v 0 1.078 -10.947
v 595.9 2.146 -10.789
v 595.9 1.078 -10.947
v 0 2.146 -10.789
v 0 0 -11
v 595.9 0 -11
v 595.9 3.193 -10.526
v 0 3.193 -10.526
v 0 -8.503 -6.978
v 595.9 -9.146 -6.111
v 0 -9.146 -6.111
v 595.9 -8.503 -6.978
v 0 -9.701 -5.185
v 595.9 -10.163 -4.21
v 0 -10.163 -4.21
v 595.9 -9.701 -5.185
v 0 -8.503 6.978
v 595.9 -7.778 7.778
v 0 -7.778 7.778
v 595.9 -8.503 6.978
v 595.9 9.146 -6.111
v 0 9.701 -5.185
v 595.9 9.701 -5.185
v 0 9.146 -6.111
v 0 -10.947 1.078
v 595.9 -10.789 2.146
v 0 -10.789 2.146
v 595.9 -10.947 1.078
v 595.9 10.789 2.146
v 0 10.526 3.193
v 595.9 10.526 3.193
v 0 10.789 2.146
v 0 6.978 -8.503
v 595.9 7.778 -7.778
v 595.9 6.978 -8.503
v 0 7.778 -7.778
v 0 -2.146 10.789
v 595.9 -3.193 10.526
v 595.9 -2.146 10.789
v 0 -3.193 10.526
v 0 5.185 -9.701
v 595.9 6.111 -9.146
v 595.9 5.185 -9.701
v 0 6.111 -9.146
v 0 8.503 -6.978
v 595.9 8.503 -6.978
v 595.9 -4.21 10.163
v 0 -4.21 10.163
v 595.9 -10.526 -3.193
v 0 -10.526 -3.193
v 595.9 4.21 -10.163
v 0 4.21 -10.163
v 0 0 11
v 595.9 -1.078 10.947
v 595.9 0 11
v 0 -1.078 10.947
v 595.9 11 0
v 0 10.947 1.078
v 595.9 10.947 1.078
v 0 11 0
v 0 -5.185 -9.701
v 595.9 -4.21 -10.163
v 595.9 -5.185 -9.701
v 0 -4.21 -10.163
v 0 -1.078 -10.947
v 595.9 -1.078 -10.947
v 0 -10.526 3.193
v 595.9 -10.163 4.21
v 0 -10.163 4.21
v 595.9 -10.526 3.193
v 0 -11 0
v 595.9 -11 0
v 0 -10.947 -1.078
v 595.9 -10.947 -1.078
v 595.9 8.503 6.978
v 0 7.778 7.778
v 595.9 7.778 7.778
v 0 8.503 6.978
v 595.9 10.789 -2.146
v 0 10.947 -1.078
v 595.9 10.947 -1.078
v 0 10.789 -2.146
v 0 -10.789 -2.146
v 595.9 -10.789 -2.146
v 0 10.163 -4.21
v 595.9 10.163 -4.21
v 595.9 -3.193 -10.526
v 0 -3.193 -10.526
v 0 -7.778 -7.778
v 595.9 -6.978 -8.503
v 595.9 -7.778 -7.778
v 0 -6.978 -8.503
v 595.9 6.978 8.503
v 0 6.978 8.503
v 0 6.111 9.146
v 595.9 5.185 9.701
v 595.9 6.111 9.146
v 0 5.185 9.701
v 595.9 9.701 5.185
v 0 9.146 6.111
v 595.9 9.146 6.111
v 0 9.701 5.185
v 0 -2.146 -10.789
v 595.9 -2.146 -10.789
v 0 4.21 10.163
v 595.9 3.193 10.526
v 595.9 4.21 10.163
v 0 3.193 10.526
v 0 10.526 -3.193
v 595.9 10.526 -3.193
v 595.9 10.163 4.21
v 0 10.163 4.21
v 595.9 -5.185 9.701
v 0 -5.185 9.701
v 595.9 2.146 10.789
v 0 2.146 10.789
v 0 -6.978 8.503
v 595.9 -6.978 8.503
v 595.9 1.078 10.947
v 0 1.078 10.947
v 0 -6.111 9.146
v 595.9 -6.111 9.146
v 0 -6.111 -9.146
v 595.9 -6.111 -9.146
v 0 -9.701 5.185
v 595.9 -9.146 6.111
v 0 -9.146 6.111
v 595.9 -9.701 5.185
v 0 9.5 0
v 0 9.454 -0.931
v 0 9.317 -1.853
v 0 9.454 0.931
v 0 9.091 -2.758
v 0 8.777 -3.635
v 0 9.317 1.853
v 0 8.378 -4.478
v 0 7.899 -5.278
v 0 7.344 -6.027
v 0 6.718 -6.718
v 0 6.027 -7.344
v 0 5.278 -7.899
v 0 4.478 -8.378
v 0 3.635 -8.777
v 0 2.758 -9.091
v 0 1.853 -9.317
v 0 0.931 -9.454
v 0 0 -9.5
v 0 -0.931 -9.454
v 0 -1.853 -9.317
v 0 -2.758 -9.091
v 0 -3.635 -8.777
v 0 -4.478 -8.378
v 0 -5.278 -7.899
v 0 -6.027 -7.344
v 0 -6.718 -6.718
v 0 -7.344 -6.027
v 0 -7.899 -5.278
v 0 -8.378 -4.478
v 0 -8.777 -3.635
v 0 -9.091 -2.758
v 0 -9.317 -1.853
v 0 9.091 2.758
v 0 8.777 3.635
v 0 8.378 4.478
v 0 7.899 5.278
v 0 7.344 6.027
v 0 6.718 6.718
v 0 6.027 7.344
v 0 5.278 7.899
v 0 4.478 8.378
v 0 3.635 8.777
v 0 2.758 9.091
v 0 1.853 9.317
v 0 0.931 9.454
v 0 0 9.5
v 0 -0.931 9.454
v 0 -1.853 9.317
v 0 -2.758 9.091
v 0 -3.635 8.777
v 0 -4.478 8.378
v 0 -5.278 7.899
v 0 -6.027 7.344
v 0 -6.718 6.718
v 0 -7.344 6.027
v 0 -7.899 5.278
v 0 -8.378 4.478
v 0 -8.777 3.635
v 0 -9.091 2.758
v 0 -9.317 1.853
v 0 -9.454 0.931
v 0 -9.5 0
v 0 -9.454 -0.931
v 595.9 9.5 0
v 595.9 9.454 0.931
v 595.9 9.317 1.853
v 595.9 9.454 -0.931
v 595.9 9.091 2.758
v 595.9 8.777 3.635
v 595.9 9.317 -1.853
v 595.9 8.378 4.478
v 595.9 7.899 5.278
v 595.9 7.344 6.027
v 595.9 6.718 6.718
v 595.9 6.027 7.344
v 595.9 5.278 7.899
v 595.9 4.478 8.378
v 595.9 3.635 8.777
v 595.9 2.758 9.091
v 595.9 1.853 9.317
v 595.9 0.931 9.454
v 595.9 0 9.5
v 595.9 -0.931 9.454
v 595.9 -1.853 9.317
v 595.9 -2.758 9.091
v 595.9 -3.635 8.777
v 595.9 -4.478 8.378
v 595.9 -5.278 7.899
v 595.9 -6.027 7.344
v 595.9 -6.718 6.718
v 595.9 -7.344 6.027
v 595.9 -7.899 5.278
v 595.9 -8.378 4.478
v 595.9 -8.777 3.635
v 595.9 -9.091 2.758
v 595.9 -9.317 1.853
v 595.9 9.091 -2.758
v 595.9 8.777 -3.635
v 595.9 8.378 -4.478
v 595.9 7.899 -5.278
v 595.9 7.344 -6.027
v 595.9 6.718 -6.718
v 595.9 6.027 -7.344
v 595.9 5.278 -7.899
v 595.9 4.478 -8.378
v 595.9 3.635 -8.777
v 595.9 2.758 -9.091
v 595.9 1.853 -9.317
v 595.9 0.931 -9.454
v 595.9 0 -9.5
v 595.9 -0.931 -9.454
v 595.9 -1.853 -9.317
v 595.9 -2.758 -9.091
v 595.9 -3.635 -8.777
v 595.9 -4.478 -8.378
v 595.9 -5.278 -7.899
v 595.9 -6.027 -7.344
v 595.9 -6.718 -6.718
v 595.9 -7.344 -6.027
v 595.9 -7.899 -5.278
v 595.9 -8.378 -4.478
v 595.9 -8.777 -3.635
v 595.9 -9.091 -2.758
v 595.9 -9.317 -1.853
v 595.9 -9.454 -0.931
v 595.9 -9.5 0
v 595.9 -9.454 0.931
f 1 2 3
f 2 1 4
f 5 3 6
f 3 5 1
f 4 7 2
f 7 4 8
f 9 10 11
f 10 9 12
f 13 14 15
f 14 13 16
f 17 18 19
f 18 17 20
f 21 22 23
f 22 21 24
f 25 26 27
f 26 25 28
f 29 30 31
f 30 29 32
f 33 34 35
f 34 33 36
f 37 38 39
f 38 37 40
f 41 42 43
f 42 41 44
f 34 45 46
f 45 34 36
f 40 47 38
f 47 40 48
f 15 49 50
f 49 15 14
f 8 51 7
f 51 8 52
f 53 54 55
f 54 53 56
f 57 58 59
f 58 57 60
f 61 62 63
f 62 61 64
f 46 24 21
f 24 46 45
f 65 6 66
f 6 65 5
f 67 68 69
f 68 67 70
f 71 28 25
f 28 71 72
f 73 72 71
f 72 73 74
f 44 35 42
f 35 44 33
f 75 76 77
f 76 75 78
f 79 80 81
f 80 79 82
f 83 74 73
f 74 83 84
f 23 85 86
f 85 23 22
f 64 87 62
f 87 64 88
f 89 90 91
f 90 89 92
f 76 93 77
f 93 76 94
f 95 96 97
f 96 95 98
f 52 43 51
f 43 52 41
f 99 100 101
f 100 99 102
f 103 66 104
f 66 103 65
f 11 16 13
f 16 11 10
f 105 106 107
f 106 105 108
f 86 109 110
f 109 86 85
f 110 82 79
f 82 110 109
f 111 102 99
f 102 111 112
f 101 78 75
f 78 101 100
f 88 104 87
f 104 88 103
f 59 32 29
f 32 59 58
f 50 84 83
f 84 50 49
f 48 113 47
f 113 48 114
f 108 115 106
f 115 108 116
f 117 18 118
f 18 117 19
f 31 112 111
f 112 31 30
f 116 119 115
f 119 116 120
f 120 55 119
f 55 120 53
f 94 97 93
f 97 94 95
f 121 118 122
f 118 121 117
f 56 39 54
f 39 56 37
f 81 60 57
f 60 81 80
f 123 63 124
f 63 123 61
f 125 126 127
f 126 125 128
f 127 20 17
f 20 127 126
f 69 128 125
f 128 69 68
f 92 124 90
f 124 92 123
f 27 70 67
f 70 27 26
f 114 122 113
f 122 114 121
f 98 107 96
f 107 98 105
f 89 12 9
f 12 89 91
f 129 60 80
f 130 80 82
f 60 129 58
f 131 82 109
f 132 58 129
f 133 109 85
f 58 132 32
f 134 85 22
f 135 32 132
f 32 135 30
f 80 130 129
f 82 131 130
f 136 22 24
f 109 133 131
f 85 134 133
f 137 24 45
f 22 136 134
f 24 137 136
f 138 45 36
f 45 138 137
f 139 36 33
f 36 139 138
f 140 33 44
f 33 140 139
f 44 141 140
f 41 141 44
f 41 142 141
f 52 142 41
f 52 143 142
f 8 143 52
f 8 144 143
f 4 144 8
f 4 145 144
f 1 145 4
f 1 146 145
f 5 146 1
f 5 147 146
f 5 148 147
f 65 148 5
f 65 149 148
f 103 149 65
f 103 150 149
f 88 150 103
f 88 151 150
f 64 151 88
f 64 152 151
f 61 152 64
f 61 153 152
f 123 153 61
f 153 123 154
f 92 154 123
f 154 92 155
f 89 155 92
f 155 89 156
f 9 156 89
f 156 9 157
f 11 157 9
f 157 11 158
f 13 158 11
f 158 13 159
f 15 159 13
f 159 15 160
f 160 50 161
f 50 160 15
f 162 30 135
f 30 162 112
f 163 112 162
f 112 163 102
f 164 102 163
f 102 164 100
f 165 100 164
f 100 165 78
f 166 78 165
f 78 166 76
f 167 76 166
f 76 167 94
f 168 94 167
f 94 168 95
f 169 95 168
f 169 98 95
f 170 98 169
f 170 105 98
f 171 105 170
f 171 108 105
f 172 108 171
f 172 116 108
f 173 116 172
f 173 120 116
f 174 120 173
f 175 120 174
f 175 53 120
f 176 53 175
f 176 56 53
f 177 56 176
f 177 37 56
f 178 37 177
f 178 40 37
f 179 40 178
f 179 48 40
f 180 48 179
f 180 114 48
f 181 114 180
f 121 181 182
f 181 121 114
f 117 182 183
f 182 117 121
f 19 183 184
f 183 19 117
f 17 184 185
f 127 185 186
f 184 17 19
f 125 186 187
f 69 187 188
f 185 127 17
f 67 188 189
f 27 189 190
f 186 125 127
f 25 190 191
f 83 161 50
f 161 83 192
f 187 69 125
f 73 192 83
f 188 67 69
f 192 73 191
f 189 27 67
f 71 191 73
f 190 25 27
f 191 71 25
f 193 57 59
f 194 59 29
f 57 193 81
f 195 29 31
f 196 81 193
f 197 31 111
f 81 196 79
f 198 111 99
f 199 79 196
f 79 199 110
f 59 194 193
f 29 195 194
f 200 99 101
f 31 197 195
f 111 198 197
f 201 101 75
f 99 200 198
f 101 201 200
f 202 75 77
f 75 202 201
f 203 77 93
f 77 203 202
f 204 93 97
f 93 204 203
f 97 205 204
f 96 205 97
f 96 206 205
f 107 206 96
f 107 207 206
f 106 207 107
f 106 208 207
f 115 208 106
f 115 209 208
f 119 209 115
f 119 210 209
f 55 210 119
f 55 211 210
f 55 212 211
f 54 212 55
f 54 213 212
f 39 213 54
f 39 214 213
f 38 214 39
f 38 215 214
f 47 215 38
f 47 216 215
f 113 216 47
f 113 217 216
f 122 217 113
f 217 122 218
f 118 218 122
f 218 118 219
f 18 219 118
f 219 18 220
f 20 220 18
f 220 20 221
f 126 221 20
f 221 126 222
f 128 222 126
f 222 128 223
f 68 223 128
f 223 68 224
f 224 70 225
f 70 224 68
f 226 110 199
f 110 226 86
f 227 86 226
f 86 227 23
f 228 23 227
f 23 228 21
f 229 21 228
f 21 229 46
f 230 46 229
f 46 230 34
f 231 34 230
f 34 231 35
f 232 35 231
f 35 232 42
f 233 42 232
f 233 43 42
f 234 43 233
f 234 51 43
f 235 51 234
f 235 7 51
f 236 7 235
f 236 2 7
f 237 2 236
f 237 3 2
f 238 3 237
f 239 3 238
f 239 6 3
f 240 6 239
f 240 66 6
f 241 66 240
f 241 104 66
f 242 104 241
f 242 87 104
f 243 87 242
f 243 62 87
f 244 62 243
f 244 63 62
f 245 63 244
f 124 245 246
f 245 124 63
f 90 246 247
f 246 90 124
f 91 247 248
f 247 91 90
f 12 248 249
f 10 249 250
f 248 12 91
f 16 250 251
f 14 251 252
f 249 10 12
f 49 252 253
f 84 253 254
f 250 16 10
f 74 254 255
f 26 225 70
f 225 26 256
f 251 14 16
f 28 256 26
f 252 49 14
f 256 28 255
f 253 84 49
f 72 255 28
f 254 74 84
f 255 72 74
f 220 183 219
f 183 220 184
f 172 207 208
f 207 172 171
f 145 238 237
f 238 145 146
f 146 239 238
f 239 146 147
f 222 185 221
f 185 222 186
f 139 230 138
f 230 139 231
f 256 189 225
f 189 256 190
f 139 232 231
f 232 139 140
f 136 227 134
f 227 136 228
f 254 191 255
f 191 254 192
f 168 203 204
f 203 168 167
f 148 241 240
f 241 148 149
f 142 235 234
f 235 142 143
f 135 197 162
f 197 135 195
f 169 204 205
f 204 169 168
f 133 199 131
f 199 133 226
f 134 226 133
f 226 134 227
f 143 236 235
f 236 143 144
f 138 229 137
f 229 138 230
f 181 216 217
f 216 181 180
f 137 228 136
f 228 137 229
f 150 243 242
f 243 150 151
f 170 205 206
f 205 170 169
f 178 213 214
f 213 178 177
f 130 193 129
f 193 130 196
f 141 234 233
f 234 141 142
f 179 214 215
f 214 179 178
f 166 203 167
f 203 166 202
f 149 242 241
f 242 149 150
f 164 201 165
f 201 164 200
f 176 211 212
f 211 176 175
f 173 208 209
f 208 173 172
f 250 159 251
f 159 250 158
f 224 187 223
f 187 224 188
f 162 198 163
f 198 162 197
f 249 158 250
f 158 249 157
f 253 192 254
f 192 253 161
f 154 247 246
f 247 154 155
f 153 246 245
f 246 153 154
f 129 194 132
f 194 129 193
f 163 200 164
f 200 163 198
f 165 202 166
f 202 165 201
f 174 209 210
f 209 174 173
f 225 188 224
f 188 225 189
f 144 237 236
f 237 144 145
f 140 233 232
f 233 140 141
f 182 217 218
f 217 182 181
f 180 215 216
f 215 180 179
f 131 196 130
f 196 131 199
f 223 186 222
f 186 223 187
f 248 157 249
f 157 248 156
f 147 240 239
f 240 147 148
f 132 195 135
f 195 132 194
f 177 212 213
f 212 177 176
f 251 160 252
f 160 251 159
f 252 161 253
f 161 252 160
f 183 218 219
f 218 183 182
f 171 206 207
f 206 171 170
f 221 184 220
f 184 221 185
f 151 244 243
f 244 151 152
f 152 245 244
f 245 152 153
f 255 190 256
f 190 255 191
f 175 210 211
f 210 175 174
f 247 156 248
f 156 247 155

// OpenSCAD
// file: ../common/ds_lib.scad
// DronSwarm · librería común de piezas del frame (S07-S08). Unidades: mm.
//
// Reglas (ADR-003): sin hull()/minkowski()/offset() — FreeCAD los convierte en malla y el STEP deja de ser un
// sólido válido. Las formas redondeadas se arman con uniones de cubos y cilindros. El importador CSG de FreeCAD
// también falla con booleanas 2D y con varios operandos agrupados bajo una sola transformación: cada grupo de
// agujeros debe ser hijo directo del difference(), con su propio translate.
//
// Interfaz de motor DronSwarm (DMI, ADR-011): placa con 4 ranuras radiales a 90°, de modo que el mismo soporte
// acepta varios patrones comerciales y, más adelante, el motor propio (S17+) se diseña para caer en el mismo rango.
//   DMI-S: 4×M3, círculo de tornillos Ø16-Ø25 (motores 28xx-41xx, ≤ 600 W)
//   DMI-L: 4×M4, círculo de tornillos Ø30-Ø42 (motores 50xx-70xx, ≤ 2 kW)

$fn = 48;

M3 = 3.3; M3_HEAD = 6.0; M3_NUT = 6.4;     // pasante, cabeza, tuerca (entre caras + juego)
M4 = 4.4; M4_HEAD = 7.5;
M5 = 5.4;

function dmi_bolt(iface) = iface == "L" ? M4 : M3;
function dmi_r(iface) = iface == "L" ? [15, 21] : [8, 12.5];   // radio mínimo y máximo de las ranuras
function dmi_plate_d(iface) = iface == "L" ? 56 : 36;
function dmi_center(iface) = iface == "L" ? 16 : 10;            // eje, seguro y paso de cables

// Rectángulo con esquinas redondeadas (2D) y su extrusión
module rrect2d(size, r) {
    r2 = min(r, size[0] / 2 - 0.01, size[1] / 2 - 0.01);
    union() {
        translate([r2, 0]) square([size[0] - 2 * r2, size[1]]);
        translate([0, r2]) square([size[0], size[1] - 2 * r2]);
        for (x = [r2, size[0] - r2], y = [r2, size[1] - r2]) translate([x, y]) circle(r = r2);
    }
}
// Caja redondeada con primitivas 3D (sin booleanas 2D: el importador CSG de FreeCAD falla con ellas)
module rbox(size, r) {
    r2 = min(r, size[0] / 2 - 0.01, size[1] / 2 - 0.01);
    union() {
        translate([r2, 0, 0]) cube([size[0] - 2 * r2, size[1], size[2]]);
        translate([0, r2, 0]) cube([size[0], size[1] - 2 * r2, size[2]]);
        for (x = [r2, size[0] - r2], y = [r2, size[1] - r2]) translate([x, y, 0]) cylinder(r = r2, h = size[2]);
    }
}
module crbox(size, r) { translate([-size[0] / 2, -size[1] / 2, 0]) rbox(size, r); }   // centrado en x/y

// Ranura (2D) entre dos puntos sobre el eje x
module slot2d(r0, r1, w) {
    union() {
        translate([r0, -w / 2]) square([r1 - r0, w]);
        translate([r0, 0]) circle(d = w);
        translate([r1, 0]) circle(d = w);
    }
}

// Agujeros de la interfaz de motor (para restar de una placa de espesor t)
module slot3d(r0, r1, w, h) {
    union() {
        translate([r0, -w / 2, 0]) cube([r1 - r0, w, h]);
        translate([r0, 0, 0]) cylinder(d = w, h = h);
        translate([r1, 0, 0]) cylinder(d = w, h = h);
    }
}
module dmi_holes(iface, t) {
    r = dmi_r(iface);
    translate([0, 0, -1]) union() {
        cylinder(d = dmi_center(iface), h = t + 2);
        for (a = [45, 135, 225, 315]) rotate(a) slot3d(r[0], r[1], dmi_bolt(iface), t + 2);
    }
}

// Soporte de motor en la punta del brazo: manguito sobre el tubo + placa DMI arriba
//   el tubo entra por -x; la placa queda centrada en el eje del motor (origen), cara superior en z = 0
module motor_mount(tube_d, iface = "S", sleeve = 34, wall = 3.5) {
    od = tube_d + 2 * wall;
    pd = dmi_plate_d(iface);
    pt = iface == "L" ? 6 : 4;
    zc = -pt - tube_d / 2 - 1;                 // eje del tubo bajo la placa
    difference() {
        union() {
            translate([0, 0, -pt]) cylinder(d = pd, h = pt);                         // placa DMI
            translate([-sleeve - pd / 2 + 6, 0, zc]) rotate([0, 90, 0])
                cylinder(d = od, h = sleeve + pd / 2 - 6 + 4);                       // manguito
            translate([-sleeve - pd / 2 + 6, -od / 2, zc]) cube([sleeve + pd / 2 - 2, od, -zc - pt + 0.01]);  // alma
            translate([-sleeve - pd / 2 + 6, -5, zc - od / 2 - 7]) cube([sleeve, 10, 8]);   // oreja de apriete
        }
        dmi_holes(iface, pt + 0.02, $fn = 32);
        translate([-sleeve - pd / 2 + 5, 0, zc]) rotate([0, 90, 0]) cylinder(d = tube_d + 0.3, h = sleeve + pd / 2 - 3); // tubo
        translate([-sleeve - pd / 2 + 4, -1, zc - od / 2 - 8]) cube([sleeve + 1, 2, od / 2 + 6]);   // ranura de apriete
        for (x = [0.3, 0.75]) translate([-sleeve - pd / 2 + 6 + x * sleeve, 0, zc - od / 2 - 3])
            rotate([90, 0, 0]) cylinder(d = M3, h = 30, center = true);                // tornillos de apriete
        translate([-pd / 2 - 2, 0, zc]) rotate([0, 90, 0]) cylinder(d = 7, h = pd);   // salida de cables del tubo
    }
}

// Bloque de brazo entre las dos placas centrales (impreso PA12-CF): sujeta el tubo y separa las placas.
//   el tubo sale por +x desde el origen; el bloque ocupa x ∈ [-len, 0], altura = gap
module arm_block(tube_d, gap, len = 40, width = 0, bolt = M3) {
    w = width > 0 ? width : tube_d + 14;
    difference() {
        translate([-len, -w / 2, 0]) rbox([len, w, gap], 2);
        translate([-len - 1, 0, gap / 2]) rotate([0, 90, 0]) cylinder(d = tube_d + 0.2, h = len + 2);   // tubo
        translate([-len - 1, -0.75, gap / 2]) cube([len + 2, 1.5, gap / 2 + 1]);                        // ranura de apriete
        for (p = arm_block_bolts(tube_d, len, w)) translate([p[0], p[1], -1]) cylinder(d = bolt, h = gap + 2);
        translate([-len * 0.5, 0, gap * 0.78]) rotate([90, 0, 0]) cylinder(d = M3, h = w + 2, center = true);  // apriete
    }
}
function arm_block_bolts(tube_d, len, w) =
    [for (x = [-len + 6, -6], y = [-(w / 2 - 3.6), w / 2 - 3.6]) [x, y]];

// Patrón de controladora de vuelo (agujeros M3 en cuadrado)
module fc_holes(pattern, t) {
    for (x = [-1, 1], y = [-1, 1]) translate([x * pattern / 2, y * pattern / 2, -1]) cylinder(d = M3, h = t + 2);
}
// file: ds_d_params.scad
// DS-D · parámetros generados por tools/cad/gen_cad_params.py el 2026-10-19
// desde engineering/data/results (spec v1). No editar a mano: regenerar. Unidades: mm, kg.

vehicle = "DS-D";
rotors = 6;
wheelbase = 1453;
arm_radius = 726.5;
prop_d = 660.4;
tube_od = 22;
tube_wall = 1.5;
arm_len = 545;
plate_d = 363.2;
plate_t = 3;
plate_gap = 28;
motor_iface = "L";
battery_dims = [220, 134.4, 76.2];
battery = "12S5P P42A";
leg_h = 420;
fold_arms = true;
mtow_kg = 15.61;
motor_mass_kg = 0.345;
fc_pattern = 30.5;
payload_box = [300, 240, 220];
payload_kg = 5;
// file: ds_d_frame.scad
// DS-D · geometría compartida del frame: posiciones derivadas de los parámetros (spec v1). Unidades: mm.
// Ejes: x adelante, y izquierda, z arriba. z = 0 es la cara superior de la placa inferior.
// Hexa con brazos desmontables (bloques con levas entre las placas, ADR-012), batería y carcasa arriba,
// mecanismo de liberación de la carga al centro abajo, tren de esquíes.

include <ds_d_params.scad>
use <../common/ds_lib.scad>
include <../common/ds_lib.scad>

arm_angles = [0, 60, 120, 180, 240, 300];      // igual que el SDF/PX4 (rotor 0 adelante)
// Brazos desmontables (ADR-012): el tubo entra en un bloque impreso entre las placas y se fija con 2 levas de
// apriete rápido; los cables del motor tienen un conector en el bloque. Se monta/desmonta sin herramientas.
block_len = 60;
block_w = tube_od + 20;
r_block_out = plate_d / 2 - 3;                  // cara exterior del bloque
tube_insert = 54;                               // el tubo entra hasta un tope interior
tube_z = plate_gap / 2;
tube_start = r_block_out - tube_insert;
tube_len = arm_radius - tube_start - 6;
mm_sleeve = 30;

// Arriba: batería transversal atrás y carcasa adelante. Abajo: liberación al centro, FPV adelante
battery_pos = [-60, 0];
housing_size = [130, 110, 62];
housing_pos = [90, 0];
housing_flange = 10;
housing_bolts = [for (x = [-1, 0, 1], y = [-1, 1]) [housing_pos[0] + x * (housing_size[0] / 2 + 6), y * (housing_size[1] / 2 + 6)]];   // fuera del canal de la junta
battery_tray_bolts = [for (x = [-1, 1], y = [-1, 1]) [battery_pos[0] + x * 50, y * 95]];
release_bolts = [for (x = [-1, 1], y = [-1, 1]) [x * 35, y * 20]];
cable_gland_pos = [housing_pos[0] - housing_size[0] / 2 + 20, 0];
fpv_pos = [plate_d / 2 - 30, 0];

// Tren de esquíes: 4 patas inclinadas desde la placa inferior hasta dos esquíes longitudinales (base ancha)
leg_x = 100;                                    // patas en x = ±leg_x
leg_y_top = 110;                                // arriba, bajo la placa
skid_y = 220;                                   // esquíes en y = ±skid_y
skid_len = 560;
gear_tube = 16;                                 // tubos Ø16×1
gear_wall = 1.0;
ground_z = -leg_h;
skid_z = ground_z + gear_tube / 2 + 6;          // eje del esquí (sobre su zapata de TPU de 6 mm)
gear_mount_h = 30;                              // soporte impreso bajo la placa
// pivotes: el del soporte (bajo la placa) y el de la T (eje del esquí); la pata va de uno a otro
pivot_top = [leg_y_top, -plate_t - 6];
pivot_bot = [skid_y, skid_z];
leg_dy = pivot_bot[0] - pivot_top[0];
leg_dz = pivot_top[1] - pivot_bot[1];
leg_tilt = atan(leg_dy / leg_dz);               // inclinación hacia afuera (en torno a x)
leg_in_top = 4;                                 // el tubo termina 4 mm antes del pivote del soporte
leg_in_bot = 10;                                // y 10 mm después del eje del esquí
leg_len = sqrt(leg_dy * leg_dy + leg_dz * leg_dz) - leg_in_top - leg_in_bot;
gear_mount_bolts = [for (sx = [-1, 1], sy = [-1, 1], d = [[-14, -10], [14, -10], [-14, 10], [14, 10]]) [sx * leg_x + d[0], sy * leg_y_top + d[1]]];

motor_d = motor_iface == "L" ? 62 : 38;
motor_h = motor_iface == "L" ? 36 : 26;
function block_bolts() = [for (x = [-block_len + 7, -block_len / 2, -7], y = [-1, 1]) [x, y * (block_w / 2 - 4.5)]];
// main file
// DS-D · brazo: tubo de carbono enrollado Ø22×1.5 (compra, corte a medida, ×6). Local: eje x desde x = 0.
include <ds_d_frame.scad>
module arm_tube() rotate([0, 90, 0]) difference() {
    cylinder(d = tube_od, h = tube_len, $fn = 64);
    translate([0, 0, -1]) cylinder(d = tube_od - 2 * tube_wall, h = tube_len + 2, $fn = 64);
}
arm_tube();
